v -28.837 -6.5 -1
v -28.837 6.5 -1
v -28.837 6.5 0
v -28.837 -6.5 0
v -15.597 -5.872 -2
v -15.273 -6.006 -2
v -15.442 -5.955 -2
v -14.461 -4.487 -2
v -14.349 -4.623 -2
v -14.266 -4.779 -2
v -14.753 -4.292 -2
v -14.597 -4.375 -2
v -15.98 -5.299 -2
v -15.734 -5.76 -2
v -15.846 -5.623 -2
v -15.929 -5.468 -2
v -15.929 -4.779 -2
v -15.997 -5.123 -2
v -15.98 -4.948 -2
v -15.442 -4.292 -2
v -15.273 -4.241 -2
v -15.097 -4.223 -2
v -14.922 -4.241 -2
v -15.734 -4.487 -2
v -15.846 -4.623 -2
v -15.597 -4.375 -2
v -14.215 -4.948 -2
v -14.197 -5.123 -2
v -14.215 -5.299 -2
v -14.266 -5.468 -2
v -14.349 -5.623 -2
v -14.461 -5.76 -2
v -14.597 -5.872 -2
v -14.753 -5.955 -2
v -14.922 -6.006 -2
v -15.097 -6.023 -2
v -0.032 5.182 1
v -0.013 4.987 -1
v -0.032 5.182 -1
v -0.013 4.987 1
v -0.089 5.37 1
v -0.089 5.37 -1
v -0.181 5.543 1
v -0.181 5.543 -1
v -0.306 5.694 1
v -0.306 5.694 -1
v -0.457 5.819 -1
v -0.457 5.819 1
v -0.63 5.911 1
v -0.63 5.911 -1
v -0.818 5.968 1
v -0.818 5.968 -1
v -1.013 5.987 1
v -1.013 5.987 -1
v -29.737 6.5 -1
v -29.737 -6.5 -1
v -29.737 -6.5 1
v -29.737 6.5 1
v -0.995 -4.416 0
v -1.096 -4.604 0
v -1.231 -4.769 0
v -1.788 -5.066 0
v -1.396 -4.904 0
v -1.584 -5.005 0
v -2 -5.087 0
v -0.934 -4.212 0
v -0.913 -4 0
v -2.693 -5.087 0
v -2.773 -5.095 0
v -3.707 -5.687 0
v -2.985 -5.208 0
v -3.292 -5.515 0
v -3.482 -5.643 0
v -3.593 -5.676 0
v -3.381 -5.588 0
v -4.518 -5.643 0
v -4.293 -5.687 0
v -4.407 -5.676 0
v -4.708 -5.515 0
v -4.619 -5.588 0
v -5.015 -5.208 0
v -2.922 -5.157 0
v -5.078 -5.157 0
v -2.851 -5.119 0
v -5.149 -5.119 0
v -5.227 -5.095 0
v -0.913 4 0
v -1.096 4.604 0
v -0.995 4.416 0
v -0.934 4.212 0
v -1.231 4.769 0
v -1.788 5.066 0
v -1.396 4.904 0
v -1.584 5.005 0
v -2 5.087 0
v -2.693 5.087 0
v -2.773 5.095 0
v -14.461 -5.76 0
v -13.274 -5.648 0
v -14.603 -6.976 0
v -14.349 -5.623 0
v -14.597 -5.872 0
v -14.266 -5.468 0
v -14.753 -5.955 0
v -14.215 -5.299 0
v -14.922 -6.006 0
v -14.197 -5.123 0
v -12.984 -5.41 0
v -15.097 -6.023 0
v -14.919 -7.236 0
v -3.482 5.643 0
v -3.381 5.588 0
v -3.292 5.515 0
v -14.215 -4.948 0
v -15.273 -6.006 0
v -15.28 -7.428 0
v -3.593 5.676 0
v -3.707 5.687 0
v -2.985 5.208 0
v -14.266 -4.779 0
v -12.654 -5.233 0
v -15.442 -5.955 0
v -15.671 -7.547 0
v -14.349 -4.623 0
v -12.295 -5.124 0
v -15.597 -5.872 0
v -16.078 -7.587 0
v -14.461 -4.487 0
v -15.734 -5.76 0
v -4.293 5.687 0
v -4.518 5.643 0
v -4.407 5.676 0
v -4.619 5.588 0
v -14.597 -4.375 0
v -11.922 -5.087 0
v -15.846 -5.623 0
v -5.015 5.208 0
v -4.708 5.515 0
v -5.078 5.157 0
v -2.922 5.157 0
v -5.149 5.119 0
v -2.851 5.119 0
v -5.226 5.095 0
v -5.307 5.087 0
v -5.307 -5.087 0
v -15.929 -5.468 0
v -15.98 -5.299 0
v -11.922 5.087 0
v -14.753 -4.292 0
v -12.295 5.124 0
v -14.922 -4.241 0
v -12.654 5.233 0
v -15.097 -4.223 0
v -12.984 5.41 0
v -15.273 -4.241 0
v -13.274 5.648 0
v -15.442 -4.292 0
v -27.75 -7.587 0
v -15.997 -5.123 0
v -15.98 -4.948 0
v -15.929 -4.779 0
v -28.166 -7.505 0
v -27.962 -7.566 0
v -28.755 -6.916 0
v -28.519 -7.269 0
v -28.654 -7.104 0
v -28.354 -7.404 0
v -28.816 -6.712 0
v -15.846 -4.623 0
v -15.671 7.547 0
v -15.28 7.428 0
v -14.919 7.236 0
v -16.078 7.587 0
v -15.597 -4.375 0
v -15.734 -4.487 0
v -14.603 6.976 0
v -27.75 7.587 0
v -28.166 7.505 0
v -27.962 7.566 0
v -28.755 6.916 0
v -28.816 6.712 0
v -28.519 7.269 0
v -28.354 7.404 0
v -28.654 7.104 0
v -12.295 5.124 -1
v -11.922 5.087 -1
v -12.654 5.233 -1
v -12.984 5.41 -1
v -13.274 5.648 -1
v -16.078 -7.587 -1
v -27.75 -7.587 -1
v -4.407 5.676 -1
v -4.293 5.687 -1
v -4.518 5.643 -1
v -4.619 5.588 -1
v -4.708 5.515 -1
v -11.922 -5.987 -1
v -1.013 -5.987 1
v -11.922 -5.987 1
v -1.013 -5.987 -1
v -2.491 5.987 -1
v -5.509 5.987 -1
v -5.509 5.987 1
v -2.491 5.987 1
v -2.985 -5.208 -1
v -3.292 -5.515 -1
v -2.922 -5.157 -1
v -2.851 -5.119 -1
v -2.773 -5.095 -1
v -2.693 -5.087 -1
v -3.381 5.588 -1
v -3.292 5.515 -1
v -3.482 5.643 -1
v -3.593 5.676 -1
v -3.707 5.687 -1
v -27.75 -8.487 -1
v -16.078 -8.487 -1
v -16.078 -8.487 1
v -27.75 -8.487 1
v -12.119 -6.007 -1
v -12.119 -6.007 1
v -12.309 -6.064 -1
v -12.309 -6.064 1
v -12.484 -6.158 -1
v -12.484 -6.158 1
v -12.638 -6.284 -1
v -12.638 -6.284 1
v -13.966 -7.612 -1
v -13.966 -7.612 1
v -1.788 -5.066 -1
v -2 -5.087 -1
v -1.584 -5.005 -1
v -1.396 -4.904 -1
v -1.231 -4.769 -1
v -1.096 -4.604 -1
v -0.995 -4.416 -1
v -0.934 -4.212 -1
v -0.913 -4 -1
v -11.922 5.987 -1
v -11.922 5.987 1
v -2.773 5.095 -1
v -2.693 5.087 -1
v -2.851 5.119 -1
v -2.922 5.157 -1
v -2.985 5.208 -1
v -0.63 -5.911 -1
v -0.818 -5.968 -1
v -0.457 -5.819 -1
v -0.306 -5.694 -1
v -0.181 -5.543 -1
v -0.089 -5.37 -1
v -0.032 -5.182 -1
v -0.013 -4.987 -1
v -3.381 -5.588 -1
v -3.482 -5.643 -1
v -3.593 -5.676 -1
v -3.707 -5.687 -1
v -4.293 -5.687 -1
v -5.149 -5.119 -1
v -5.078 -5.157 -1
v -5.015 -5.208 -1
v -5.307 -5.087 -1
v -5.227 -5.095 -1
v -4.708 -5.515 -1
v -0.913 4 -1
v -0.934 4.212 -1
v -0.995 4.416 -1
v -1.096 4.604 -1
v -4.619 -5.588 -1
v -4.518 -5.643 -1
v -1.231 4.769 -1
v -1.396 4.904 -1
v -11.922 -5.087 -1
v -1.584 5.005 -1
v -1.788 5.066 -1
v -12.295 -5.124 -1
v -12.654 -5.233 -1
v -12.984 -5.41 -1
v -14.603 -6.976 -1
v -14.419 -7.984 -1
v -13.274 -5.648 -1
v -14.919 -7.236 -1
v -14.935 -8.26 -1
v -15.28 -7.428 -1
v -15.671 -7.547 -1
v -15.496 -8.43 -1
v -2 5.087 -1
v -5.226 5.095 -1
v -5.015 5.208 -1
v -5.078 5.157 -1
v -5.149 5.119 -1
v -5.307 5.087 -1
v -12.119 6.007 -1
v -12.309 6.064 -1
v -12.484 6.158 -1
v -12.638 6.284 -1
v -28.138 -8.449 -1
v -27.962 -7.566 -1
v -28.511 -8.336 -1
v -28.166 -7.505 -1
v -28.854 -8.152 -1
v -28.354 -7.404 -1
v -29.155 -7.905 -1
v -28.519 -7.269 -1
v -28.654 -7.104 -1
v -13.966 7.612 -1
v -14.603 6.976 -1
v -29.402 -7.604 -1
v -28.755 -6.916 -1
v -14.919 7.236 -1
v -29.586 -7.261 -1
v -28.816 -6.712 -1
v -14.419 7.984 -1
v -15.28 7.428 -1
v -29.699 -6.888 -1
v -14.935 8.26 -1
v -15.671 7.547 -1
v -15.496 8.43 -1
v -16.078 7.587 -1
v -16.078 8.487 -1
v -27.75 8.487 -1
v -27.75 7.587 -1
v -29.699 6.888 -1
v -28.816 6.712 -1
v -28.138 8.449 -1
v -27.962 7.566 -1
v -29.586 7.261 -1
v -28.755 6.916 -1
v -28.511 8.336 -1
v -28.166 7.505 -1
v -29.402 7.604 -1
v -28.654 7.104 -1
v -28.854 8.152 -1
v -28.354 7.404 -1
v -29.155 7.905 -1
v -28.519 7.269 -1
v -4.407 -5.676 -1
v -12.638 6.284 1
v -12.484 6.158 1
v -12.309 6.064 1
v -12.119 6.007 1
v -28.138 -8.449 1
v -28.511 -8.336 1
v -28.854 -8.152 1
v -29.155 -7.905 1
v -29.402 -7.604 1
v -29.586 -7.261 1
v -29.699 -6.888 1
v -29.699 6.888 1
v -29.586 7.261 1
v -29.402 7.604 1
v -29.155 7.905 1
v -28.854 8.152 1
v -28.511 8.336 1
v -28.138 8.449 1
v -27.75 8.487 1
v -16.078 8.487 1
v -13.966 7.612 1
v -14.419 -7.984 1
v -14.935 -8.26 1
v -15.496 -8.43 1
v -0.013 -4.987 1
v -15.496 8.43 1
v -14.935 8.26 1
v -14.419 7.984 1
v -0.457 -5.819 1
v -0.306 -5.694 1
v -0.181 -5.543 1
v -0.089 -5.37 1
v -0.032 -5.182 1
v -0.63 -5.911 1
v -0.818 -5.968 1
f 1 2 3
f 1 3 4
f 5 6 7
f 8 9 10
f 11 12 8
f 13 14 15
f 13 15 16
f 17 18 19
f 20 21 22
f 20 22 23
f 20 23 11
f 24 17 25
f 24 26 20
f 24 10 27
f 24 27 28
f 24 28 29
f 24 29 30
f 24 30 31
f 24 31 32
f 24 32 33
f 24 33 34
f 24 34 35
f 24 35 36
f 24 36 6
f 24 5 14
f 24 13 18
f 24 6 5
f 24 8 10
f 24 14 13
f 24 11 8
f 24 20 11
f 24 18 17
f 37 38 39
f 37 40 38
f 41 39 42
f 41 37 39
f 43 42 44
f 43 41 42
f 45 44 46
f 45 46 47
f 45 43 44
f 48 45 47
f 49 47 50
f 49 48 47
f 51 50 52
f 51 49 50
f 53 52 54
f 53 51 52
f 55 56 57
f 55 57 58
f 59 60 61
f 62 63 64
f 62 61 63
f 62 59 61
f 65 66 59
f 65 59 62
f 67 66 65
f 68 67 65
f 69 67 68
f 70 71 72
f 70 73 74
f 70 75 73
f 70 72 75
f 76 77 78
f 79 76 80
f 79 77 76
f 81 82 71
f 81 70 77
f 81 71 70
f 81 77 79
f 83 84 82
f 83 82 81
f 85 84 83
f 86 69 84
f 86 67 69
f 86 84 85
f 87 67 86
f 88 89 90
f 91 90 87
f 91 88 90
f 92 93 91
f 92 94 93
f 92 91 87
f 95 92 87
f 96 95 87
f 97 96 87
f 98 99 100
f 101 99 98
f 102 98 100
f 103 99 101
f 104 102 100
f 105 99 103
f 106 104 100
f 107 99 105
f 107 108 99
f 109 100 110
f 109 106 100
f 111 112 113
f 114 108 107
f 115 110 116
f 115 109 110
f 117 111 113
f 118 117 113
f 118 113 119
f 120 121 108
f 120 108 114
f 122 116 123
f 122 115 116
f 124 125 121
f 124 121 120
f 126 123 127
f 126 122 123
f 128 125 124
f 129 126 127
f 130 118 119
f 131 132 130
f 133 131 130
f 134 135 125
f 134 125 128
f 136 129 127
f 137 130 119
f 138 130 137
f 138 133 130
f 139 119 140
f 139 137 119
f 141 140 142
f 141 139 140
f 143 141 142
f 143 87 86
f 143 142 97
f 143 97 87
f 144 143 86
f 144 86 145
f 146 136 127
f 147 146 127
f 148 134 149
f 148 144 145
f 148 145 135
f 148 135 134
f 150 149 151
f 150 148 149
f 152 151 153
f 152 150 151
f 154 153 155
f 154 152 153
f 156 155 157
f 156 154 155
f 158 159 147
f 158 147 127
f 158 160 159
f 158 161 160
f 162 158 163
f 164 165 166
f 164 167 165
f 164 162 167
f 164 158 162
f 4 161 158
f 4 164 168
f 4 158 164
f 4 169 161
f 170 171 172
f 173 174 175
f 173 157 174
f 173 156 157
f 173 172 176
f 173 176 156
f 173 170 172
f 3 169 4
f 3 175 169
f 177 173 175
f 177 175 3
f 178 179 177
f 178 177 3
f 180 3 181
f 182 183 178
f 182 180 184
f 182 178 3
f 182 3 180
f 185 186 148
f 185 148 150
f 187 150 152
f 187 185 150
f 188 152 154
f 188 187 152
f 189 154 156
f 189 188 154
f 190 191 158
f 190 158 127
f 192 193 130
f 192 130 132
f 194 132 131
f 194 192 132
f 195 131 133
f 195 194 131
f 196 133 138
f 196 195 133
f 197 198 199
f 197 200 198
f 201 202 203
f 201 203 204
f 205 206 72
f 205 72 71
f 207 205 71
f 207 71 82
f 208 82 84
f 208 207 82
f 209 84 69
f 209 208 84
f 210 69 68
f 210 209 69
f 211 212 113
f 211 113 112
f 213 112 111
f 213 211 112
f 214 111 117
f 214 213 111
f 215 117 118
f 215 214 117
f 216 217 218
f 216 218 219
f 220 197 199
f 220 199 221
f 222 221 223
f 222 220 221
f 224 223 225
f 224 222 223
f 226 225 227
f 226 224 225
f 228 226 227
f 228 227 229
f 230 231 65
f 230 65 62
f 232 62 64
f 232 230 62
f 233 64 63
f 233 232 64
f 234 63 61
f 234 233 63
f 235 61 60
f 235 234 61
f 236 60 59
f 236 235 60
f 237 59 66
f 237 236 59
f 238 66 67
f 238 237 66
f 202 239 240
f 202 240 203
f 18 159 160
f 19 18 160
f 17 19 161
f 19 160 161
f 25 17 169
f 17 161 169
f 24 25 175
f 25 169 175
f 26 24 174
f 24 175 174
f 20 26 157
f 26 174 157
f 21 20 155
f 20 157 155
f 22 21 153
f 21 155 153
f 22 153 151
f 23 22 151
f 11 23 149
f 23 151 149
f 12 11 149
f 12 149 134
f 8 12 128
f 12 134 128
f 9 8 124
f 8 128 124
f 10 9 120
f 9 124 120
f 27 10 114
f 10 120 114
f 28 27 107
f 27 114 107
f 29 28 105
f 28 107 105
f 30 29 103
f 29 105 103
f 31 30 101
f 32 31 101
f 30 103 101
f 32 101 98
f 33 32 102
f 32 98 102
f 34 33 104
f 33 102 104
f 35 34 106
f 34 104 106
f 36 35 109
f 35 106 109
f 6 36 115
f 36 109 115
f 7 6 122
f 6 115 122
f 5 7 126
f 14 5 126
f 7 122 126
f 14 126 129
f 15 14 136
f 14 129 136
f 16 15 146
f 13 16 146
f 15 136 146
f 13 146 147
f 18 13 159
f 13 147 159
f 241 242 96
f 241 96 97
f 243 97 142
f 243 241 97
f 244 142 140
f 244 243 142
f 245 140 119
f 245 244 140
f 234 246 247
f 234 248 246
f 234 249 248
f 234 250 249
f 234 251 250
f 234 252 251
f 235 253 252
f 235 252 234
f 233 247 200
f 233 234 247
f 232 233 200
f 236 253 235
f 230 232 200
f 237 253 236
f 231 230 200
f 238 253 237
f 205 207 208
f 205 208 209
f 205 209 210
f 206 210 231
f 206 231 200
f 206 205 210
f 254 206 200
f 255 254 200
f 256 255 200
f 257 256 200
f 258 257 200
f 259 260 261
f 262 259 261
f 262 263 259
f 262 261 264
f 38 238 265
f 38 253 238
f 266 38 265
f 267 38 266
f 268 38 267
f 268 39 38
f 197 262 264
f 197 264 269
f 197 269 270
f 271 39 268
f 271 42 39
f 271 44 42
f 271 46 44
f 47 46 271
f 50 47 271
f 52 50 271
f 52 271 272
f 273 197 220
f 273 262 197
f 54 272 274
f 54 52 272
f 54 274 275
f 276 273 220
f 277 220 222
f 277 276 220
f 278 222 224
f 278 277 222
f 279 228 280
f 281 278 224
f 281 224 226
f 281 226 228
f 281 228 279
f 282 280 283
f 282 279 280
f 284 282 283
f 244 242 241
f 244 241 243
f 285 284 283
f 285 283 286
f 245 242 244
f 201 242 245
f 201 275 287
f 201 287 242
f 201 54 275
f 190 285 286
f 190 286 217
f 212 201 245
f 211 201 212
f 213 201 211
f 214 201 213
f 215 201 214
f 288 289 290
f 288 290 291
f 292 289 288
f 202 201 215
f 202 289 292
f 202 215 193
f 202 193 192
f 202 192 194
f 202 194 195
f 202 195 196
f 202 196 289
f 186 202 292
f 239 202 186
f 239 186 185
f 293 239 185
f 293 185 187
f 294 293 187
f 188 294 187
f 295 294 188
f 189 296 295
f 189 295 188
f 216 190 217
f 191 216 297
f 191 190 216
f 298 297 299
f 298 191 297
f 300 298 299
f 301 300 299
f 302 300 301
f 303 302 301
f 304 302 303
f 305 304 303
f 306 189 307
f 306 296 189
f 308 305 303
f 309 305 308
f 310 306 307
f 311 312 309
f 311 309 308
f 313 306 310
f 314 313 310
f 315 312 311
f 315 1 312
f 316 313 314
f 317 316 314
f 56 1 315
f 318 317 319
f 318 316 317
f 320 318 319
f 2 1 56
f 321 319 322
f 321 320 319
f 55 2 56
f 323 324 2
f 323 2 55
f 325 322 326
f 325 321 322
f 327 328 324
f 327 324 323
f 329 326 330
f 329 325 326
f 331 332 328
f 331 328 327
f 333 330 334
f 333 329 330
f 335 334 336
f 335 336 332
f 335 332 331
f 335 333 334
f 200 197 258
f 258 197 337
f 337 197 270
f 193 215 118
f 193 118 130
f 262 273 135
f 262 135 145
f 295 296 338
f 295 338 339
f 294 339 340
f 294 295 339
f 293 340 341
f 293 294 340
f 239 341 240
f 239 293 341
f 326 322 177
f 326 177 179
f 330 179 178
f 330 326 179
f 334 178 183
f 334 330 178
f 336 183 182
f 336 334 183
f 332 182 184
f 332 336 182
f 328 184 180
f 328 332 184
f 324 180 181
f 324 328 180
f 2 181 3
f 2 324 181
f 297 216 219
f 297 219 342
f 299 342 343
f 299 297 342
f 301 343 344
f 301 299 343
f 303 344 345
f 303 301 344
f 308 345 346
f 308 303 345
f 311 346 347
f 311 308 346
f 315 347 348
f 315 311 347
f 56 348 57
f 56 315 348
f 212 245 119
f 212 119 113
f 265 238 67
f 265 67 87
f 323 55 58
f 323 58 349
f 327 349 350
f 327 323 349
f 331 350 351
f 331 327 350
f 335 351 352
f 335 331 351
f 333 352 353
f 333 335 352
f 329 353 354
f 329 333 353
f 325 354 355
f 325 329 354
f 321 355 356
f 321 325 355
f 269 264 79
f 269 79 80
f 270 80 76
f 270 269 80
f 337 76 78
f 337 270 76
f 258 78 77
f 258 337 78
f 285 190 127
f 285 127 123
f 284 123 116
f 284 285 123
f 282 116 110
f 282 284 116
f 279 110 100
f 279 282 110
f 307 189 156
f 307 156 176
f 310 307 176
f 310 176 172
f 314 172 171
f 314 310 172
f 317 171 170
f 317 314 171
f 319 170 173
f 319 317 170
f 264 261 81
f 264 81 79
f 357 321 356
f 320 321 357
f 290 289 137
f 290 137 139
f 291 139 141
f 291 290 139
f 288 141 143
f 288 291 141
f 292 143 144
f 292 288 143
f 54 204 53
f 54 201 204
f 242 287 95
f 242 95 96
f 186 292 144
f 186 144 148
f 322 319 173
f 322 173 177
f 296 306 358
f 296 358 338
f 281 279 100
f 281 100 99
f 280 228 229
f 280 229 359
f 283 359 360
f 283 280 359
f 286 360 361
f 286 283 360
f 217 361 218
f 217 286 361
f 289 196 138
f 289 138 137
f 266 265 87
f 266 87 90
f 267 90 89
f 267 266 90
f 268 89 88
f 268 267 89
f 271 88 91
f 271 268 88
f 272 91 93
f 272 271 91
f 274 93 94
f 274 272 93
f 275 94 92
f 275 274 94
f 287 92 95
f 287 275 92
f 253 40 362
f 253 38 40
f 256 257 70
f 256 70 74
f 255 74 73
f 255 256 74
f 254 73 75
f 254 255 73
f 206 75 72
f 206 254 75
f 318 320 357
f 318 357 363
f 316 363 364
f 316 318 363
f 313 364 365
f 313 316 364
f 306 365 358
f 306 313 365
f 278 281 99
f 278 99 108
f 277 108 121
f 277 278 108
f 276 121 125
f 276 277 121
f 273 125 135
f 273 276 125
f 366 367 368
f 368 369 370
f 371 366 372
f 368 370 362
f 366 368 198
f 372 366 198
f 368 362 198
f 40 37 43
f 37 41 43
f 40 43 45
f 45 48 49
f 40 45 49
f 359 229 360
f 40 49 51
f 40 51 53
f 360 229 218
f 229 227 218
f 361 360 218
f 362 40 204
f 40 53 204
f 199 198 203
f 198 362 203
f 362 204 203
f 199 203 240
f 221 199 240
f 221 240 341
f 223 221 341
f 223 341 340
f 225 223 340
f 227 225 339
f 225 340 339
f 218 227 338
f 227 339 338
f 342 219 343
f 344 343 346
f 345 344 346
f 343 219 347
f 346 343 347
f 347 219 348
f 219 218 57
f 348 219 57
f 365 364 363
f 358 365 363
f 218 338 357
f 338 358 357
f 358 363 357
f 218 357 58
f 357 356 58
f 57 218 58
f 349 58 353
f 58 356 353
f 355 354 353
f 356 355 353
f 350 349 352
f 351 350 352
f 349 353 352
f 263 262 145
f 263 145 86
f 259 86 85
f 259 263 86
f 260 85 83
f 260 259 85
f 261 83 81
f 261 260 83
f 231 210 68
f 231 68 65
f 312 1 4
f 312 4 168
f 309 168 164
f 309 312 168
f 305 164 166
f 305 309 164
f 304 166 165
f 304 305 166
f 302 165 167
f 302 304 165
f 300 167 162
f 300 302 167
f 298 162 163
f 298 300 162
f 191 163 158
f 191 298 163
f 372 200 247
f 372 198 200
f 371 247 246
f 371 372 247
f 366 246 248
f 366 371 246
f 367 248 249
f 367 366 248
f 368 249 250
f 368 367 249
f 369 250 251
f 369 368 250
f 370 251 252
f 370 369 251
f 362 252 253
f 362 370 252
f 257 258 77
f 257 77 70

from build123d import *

# Parameters (mm, degrees)
EXTRUDE_1_DEPTH = 1
EXTRUDE_START   = 1
EXTRUDE_2_DEPTH = 1
EXTRUDE_3_DEPTH = 2
FILLET_1_R      = 1


with BuildPart() as part:
    # 草图1 → 凸台-拉伸1 (new body)
    with BuildSketch(Plane.XY):
        with BuildLine():
            ThreePointArc((-11.921595121, -5.987310135), (-12.309141559, -6.064397915), (-12.637687565, -6.283925339))
            Line((-12.637687565, -6.283925339), (-13.9661153, -7.612353074))
            ThreePointArc((-13.9661153, -7.612353074), (-14.935267633, -8.259919962), (-16.078460757, -8.487315215))
            Line((-16.078460757, -8.487315215), (-27.75005588, -8.487315215))
            ThreePointArc((-27.75005588, -8.487315215), (-29.155290964, -7.905247784), (-29.737358395, -6.5000127))
            Line((-29.737358395, -6.5000127), (-29.737358395, 6.5000127))
            ThreePointArc((-29.737358395, 6.5000127), (-29.155290964, 7.905247784), (-27.75005588, 8.487315215))
            Line((-27.75005588, 8.487315215), (-16.078460755, 8.487315215))
            ThreePointArc((-16.078460755, 8.487315215), (-14.935267633, 8.259919962), (-13.966115301, 7.612353076))
            Line((-13.966115301, 7.612353076), (-12.637687563, 6.283925337))
            ThreePointArc((-12.637687563, 6.283925337), (-12.309141741, 6.06439799), (-11.921595517, 5.987310135))
            Line((-11.921595517, 5.987310135), (-5.508963215, 5.987312659))
            Line((-5.508963215, 5.987312659), (-2.49105204, 5.987310135))
            Line((-2.49105204, 5.987310135), (-2.00000508, 5.987310135))
            Line((-2.00000508, 5.987310135), (-0.012702565, 5.987310135))
            Line((-0.012702565, 5.987310135), (-0.012702565, 4.00000762))
            Line((-0.012702565, 4.00000762), (-0.012702565, -4.00000762))
            Line((-0.012702565, -4.00000762), (-0.012702565, -5.987310135))
            Line((-0.012702565, -5.987310135), (-2.00000508, -5.987310135))
            Line((-2.00000508, -5.987310135), (-2.49105458, -5.987310135))
            Line((-2.49105458, -5.987310135), (-5.5089632, -5.987310135))
            Line((-5.5089632, -5.987310135), (-11.921595121, -5.987310135))
        make_face()
    extrude(amount=EXTRUDE_1_DEPTH)

    # 草图2 → 凸台-拉伸2 (add)
    with BuildSketch(Plane(origin=(0, 0, 0), x_dir=(-1, 0, 0), z_dir=(0, 0, -1)).offset(EXTRUDE_START)):
        with BuildLine():
            Line((0.012702565, -5.987310135), (11.921595121, -5.987310135))
            ThreePointArc((11.921595121, -5.987310135), (12.309141559, -6.064397915), (12.637687565, -6.283925339))
            Line((12.637687565, -6.283925339), (13.9661153, -7.612353074))
            ThreePointArc((13.9661153, -7.612353074), (14.935267633, -8.259919962), (16.078460757, -8.487315215))
            Line((16.078460757, -8.487315215), (27.75005588, -8.487315215))
            ThreePointArc((27.75005588, -8.487315215), (29.155290964, -7.905247784), (29.737358395, -6.5000127))
            Line((29.737358395, -6.5000127), (29.737358395, 6.5000127))
            ThreePointArc((29.737358395, 6.5000127), (29.155290964, 7.905247784), (27.75005588, 8.487315215))
            Line((27.75005588, 8.487315215), (16.078460755, 8.487315215))
            ThreePointArc((16.078460755, 8.487315215), (14.935267633, 8.259919962), (13.966115301, 7.612353076))
            Line((13.966115301, 7.612353076), (12.637687563, 6.283925337))
            ThreePointArc((12.637687563, 6.283925337), (12.309141741, 6.06439799), (11.921595517, 5.987310135))
            Line((11.921595517, 5.987310135), (5.508963215, 5.987312659))
            Line((5.508963215, 5.987312659), (2.49105204, 5.987310135))
            Line((2.49105204, 5.987310135), (0.012702565, 5.987310135))
            Line((0.012702565, 5.987310135), (0.012702565, -5.987310135))
        make_face()
        with BuildLine():
            Line((0.912702565, -4.00000762), (0.912702565, 4.00000762))
            ThreePointArc((0.912702565, 4.00000762), (1.231166099, 4.768846601), (2.00000508, 5.087310135))
            Line((2.00000508, 5.087310135), (2.692900097, 5.087310135))
            ThreePointArc((2.692900097, 5.087310135), (2.850834155, 5.118726257), (2.984723794, 5.208189682))
            Line((2.984723794, 5.208189682), (3.291830699, 5.515296587))
            ThreePointArc((3.291830699, 5.515296587), (3.482364562, 5.642607176), (3.707114551, 5.687312675))
            Line((3.707114551, 5.687312675), (4.292903203, 5.687312675))
            ThreePointArc((4.292903203, 5.687312675), (4.517653218, 5.642607176), (4.708187099, 5.515296569))
            Line((4.708187099, 5.515296569), (5.015294015, 5.208189653))
            ThreePointArc((5.015294015, 5.208189653), (5.149076381, 5.118771977), (5.306884994, 5.087312733))
            Line((5.306884994, 5.087312733), (11.921595123, 5.087310135))
            ThreePointArc((11.921595123, 5.087310135), (12.653556649, 5.232906336), (13.274083668, 5.647529236))
            Line((13.274083668, 5.647529236), (14.602511404, 6.975956972))
            ThreePointArc((14.602511404, 6.975956972), (15.279682723, 7.428428383), (16.078460757, 7.587315215))
            Line((16.078460757, 7.587315215), (27.75005588, 7.587315215))
            ThreePointArc((27.75005588, 7.587315215), (28.518894861, 7.268851681), (28.837358395, 6.5000127))
            Line((28.837358395, 6.5000127), (28.837358395, -6.5000127))
            ThreePointArc((28.837358395, -6.5000127), (28.518894861, -7.268851681), (27.75005588, -7.587315215))
            Line((27.75005588, -7.587315215), (16.078460757, -7.587315215))
            ThreePointArc((16.078460757, -7.587315215), (15.279682723, -7.428428383), (14.602511404, -6.975956973))
            Line((14.602511404, -6.975956973), (13.274083667, -5.647529236))
            ThreePointArc((13.274083667, -5.647529236), (12.653556649, -5.232906336), (11.921595123, -5.087310135))
            Line((11.921595123, -5.087310135), (5.307117071, -5.087310135))
            ThreePointArc((5.307117071, -5.087310135), (5.149183592, -5.118725011), (5.015294034, -5.208187095))
            Line((5.015294034, -5.208187095), (4.708187081, -5.515294047))
            ThreePointArc((4.708187081, -5.515294047), (4.517653218, -5.642604636), (4.292903229, -5.687310135))
            Line((4.292903229, -5.687310135), (3.707114577, -5.687310135))
            ThreePointArc((3.707114577, -5.687310135), (3.482364562, -5.642604636), (3.291830681, -5.515294029))
            Line((3.291830681, -5.515294029), (2.984723765, -5.208187113))
            ThreePointArc((2.984723765, -5.208187113), (2.850834188, -5.118725011), (2.692900682, -5.087310135))
            Line((2.692900682, -5.087310135), (2.00000508, -5.087310135))
            ThreePointArc((2.00000508, -5.087310135), (1.231166099, -4.768846601), (0.912702565, -4.00000762))
        make_face(mode=Mode.SUBTRACT)
    extrude(amount=-EXTRUDE_2_DEPTH)

    # 草图2<4> → 凸台-拉伸3 (add)
    with BuildSketch(Plane(origin=(0, 0, 0), x_dir=(-1, 0, 0), z_dir=(0, 0, -1))):
        with BuildLine():
            ThreePointArc((14.197426975, -5.123210566), (15.097429515, -6.023213106), (15.997432055, -5.123210566))
            ThreePointArc((15.997432055, -5.123210566), (15.097429515, -4.223208026), (14.197426975, -5.123210566))
        make_face()
    extrude(amount=EXTRUDE_3_DEPTH)

    # 圆角1
    fillet_1_edges = [part.edges().sort_by_distance(p)[0] for p in [
        (-0.012702565, 5.987310135, 0),
        (-0.012702565, -5.987310135, 0),
    ]]
    fillet(fillet_1_edges, radius=FILLET_1_R)


solid = part.part
